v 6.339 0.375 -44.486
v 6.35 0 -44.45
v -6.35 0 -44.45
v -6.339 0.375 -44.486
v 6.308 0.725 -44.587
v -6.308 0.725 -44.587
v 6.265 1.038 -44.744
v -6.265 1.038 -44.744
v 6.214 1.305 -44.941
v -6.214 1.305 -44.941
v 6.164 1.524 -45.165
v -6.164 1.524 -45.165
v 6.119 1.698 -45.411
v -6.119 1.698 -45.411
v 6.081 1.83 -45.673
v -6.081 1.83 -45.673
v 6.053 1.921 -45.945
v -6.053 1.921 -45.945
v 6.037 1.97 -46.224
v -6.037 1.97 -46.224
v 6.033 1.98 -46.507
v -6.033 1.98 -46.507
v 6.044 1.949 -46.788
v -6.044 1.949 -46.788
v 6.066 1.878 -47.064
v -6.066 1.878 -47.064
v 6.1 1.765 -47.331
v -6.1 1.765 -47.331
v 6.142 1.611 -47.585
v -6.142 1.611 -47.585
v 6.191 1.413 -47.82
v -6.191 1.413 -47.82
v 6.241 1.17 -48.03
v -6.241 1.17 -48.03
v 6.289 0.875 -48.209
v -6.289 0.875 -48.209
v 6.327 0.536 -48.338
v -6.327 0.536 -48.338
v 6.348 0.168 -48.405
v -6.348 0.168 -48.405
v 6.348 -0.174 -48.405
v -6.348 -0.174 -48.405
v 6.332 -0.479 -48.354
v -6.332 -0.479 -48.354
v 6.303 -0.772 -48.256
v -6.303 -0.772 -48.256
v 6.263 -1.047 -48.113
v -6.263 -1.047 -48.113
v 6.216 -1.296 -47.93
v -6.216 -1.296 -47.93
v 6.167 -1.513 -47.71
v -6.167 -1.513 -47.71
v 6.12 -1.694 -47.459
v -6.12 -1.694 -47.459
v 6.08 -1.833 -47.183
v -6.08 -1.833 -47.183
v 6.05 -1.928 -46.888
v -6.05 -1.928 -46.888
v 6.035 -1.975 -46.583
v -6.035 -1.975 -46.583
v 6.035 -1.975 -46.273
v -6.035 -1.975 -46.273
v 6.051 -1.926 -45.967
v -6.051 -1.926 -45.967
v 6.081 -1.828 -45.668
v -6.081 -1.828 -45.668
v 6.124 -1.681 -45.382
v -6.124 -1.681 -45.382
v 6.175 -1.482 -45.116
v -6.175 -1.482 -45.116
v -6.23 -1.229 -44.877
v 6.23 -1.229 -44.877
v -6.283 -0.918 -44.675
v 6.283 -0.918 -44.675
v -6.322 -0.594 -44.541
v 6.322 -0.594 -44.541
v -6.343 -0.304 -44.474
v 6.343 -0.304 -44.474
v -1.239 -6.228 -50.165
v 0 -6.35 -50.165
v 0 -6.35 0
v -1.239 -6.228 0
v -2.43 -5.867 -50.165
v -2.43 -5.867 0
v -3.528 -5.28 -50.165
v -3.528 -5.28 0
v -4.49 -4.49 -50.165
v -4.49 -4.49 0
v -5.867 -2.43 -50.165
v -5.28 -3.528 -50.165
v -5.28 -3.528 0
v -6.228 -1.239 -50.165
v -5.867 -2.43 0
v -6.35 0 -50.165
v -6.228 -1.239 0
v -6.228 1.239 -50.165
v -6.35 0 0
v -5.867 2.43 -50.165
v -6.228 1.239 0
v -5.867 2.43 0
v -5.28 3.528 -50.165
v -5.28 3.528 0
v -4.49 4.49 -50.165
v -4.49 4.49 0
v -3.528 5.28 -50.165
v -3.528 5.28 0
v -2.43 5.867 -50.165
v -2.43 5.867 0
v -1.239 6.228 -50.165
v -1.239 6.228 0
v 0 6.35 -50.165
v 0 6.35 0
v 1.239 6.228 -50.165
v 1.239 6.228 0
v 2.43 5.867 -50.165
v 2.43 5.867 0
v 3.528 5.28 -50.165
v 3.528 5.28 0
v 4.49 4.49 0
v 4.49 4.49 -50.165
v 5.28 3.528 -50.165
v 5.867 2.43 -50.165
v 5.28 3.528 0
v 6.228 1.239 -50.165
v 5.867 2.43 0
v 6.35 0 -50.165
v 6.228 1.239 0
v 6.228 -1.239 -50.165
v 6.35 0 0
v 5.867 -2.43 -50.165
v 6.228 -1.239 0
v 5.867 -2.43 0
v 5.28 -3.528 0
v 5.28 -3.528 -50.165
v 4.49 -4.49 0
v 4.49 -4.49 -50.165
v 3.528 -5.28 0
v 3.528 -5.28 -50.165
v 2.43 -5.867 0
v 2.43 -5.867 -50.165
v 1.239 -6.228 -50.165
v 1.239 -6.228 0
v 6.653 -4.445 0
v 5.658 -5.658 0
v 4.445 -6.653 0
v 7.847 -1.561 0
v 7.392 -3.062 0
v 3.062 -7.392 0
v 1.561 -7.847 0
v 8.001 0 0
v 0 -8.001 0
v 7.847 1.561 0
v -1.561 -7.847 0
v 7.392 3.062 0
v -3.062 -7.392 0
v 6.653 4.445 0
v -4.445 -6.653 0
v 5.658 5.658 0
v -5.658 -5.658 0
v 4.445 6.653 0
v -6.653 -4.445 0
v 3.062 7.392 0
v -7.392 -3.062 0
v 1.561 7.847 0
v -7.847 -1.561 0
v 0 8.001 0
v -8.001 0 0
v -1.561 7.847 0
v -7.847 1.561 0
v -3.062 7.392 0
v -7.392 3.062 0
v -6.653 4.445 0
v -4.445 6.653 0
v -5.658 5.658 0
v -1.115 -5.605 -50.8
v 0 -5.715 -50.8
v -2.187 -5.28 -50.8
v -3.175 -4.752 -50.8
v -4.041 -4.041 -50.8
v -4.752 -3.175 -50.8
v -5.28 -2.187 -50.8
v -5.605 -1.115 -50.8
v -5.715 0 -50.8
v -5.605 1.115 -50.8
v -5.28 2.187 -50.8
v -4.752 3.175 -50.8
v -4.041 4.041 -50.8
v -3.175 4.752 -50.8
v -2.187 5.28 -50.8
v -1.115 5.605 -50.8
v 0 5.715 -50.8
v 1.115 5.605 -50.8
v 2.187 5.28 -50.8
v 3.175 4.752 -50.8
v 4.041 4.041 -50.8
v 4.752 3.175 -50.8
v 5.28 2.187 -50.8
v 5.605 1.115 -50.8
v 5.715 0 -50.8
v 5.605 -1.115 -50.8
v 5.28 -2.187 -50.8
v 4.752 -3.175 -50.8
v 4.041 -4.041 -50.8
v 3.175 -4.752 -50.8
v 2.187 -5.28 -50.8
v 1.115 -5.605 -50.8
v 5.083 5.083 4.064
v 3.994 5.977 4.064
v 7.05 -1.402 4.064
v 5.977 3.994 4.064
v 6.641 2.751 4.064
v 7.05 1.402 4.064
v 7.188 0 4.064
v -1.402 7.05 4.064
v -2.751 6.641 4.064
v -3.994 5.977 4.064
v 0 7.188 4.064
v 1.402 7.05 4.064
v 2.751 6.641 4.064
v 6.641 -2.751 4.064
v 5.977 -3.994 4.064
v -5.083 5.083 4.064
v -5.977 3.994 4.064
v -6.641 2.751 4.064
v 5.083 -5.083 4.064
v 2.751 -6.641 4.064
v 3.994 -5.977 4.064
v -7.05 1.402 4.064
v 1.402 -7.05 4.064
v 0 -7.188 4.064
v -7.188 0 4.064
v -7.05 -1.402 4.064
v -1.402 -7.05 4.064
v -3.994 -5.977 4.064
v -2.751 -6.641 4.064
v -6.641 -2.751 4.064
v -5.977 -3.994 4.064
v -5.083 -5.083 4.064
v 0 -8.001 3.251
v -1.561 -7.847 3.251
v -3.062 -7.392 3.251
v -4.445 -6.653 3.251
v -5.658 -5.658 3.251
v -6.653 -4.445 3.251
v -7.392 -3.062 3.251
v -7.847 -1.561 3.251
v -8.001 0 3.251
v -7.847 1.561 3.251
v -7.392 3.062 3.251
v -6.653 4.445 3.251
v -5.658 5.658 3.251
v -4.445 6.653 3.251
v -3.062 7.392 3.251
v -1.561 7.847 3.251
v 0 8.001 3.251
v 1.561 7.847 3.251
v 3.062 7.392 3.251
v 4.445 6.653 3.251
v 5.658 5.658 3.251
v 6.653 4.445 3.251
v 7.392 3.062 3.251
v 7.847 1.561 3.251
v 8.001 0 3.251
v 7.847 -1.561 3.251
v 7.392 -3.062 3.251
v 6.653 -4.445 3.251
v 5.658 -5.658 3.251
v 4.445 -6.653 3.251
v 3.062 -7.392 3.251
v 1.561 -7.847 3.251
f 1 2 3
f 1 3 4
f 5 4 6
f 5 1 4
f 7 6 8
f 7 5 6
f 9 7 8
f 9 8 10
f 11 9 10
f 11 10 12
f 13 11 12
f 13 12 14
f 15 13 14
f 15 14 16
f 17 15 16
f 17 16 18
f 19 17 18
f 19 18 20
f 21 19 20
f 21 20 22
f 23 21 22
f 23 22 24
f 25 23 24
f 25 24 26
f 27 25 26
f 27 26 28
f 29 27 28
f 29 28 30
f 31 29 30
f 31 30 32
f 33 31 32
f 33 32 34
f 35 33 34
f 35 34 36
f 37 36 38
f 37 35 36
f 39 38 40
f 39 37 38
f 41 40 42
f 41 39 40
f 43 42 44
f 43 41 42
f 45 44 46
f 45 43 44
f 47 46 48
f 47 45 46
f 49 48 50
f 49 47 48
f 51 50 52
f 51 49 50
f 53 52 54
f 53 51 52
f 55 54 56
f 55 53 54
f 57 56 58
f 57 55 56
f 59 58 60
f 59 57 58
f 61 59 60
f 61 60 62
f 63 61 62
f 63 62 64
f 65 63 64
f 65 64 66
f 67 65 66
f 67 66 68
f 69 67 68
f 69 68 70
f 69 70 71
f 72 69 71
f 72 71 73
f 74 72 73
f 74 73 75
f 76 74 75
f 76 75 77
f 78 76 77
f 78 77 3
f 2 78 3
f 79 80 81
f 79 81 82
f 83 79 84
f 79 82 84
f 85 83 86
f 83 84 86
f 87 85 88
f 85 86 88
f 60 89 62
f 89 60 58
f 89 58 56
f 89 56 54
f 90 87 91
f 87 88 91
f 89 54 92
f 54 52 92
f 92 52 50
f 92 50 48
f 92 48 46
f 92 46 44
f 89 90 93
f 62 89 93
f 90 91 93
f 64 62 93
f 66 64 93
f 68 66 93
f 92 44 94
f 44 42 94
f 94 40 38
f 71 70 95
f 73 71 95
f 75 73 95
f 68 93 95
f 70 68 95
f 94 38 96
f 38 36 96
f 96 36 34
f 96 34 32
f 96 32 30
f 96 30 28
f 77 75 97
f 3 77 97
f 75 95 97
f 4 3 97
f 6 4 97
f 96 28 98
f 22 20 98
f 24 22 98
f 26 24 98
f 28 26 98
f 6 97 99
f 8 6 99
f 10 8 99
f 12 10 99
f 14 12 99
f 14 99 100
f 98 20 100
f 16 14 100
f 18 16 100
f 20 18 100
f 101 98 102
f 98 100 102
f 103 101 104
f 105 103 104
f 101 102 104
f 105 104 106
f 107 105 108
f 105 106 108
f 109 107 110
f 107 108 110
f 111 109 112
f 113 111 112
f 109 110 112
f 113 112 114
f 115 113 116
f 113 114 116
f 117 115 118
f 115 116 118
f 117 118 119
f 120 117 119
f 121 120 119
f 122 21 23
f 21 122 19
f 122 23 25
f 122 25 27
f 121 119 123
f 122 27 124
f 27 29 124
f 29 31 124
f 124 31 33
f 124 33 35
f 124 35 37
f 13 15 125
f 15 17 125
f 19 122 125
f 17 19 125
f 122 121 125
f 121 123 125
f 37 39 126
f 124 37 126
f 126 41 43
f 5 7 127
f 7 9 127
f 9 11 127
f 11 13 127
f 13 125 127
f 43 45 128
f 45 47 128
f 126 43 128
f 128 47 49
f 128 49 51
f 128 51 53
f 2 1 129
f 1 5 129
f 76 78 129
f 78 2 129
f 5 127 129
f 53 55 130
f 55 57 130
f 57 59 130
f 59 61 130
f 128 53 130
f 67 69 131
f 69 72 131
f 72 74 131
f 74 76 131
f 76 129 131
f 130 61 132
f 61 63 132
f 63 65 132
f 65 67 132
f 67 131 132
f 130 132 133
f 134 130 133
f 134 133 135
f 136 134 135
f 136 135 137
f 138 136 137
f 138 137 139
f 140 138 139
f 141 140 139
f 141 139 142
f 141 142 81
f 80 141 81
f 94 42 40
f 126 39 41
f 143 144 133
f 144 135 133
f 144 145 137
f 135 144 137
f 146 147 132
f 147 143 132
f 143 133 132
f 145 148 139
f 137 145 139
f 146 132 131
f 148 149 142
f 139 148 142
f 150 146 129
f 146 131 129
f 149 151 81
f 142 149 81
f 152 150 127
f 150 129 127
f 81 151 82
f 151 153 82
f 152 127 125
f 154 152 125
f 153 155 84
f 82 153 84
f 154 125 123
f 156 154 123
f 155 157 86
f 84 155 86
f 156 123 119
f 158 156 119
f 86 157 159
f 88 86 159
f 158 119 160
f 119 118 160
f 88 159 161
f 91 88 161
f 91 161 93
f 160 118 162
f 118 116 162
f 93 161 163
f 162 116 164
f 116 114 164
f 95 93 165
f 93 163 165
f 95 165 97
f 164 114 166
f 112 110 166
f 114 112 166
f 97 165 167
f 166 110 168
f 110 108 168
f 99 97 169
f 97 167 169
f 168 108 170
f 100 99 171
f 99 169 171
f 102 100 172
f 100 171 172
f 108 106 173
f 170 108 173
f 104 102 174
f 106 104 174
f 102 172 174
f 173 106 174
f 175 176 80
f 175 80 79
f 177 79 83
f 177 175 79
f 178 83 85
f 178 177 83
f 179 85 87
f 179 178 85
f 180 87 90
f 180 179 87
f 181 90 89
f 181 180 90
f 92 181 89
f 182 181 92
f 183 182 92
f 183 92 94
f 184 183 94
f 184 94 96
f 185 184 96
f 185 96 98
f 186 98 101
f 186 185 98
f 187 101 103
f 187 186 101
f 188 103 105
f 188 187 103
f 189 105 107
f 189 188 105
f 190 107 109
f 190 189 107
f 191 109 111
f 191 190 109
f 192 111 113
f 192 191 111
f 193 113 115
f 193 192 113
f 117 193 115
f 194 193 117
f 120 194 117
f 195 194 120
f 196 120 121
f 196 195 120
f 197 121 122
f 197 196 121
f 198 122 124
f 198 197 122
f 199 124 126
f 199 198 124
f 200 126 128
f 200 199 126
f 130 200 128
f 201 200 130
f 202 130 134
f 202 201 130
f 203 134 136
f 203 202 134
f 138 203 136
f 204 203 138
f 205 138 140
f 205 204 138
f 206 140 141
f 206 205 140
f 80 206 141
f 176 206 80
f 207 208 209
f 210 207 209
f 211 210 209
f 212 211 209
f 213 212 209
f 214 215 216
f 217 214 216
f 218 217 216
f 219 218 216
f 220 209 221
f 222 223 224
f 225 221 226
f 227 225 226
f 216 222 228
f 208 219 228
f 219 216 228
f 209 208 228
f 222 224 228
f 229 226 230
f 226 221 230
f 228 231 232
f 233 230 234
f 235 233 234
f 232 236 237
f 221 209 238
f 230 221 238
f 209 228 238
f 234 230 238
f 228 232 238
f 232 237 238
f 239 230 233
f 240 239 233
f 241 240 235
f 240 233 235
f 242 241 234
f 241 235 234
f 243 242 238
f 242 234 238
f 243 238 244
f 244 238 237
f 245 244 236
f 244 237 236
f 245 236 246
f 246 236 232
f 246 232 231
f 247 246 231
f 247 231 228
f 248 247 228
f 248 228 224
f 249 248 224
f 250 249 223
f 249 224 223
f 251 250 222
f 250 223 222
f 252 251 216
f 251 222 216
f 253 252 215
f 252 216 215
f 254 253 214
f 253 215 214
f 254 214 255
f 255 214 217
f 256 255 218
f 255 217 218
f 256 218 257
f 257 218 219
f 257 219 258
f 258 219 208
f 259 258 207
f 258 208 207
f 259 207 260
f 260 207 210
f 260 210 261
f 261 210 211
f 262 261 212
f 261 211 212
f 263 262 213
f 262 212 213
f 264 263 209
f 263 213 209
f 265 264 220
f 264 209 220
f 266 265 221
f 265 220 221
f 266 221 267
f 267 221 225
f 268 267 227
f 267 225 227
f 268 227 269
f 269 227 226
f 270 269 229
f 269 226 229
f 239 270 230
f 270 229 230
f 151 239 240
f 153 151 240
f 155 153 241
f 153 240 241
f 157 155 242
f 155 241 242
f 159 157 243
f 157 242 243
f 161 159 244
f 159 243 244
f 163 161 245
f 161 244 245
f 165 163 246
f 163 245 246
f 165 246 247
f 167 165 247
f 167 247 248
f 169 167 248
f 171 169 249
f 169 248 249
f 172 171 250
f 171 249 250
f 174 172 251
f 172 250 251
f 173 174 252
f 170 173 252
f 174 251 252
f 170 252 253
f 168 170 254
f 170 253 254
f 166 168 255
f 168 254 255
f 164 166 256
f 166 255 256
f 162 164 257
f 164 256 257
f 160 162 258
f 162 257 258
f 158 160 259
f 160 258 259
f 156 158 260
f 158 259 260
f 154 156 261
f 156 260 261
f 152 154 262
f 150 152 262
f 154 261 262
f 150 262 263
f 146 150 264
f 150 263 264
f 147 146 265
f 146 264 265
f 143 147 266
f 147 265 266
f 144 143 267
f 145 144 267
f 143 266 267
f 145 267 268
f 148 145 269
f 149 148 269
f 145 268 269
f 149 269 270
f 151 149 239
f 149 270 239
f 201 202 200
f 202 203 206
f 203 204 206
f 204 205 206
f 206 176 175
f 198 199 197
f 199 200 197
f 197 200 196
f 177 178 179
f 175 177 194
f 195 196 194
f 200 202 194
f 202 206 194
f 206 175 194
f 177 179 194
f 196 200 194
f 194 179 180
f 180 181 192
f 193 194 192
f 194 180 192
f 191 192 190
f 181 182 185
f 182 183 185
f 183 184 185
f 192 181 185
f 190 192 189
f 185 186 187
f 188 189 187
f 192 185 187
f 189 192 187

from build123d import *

# Parameters (mm, degrees)
CUT_EXTRUDE1_DEPTH      = 59.259372654
CUT_EXTRUDE1_DEPTH_BACK = 59.259372654
SKETCH2_R               = 1.9812
CHAMFER1_SIZE           = 0.8128
CHAMFER2_SIZE           = 0.635


with BuildPart() as part:
    # Sketch4 → Revolve1 (revolve)
    with BuildSketch(Plane(origin=(0, 0, 0), x_dir=(0, 0, -1), z_dir=(1, 0, 0)), mode=Mode.PRIVATE) as revolve1_sk:
        Polygon((-4.064, 0), (50.8, 0), (50.8, 6.35), (0, 6.35), (0, 8.001), (-4.064, 8.001), align=None)
    revolve(revolve1_sk.sketch.rotate(Axis((0, 0, 4.064), (0, 0, -1)), 180), axis=Axis((0, 0, 4.064), (0, 0, -1)))

    # Sketch2 → Cut-Extrude1 (cut, two sides: drawn at the far end of the back side and taken through both)
    with BuildSketch(Plane(origin=(0, 0, 6.35), x_dir=(0, 0, 1), z_dir=(-1, 0, 0)).offset(-CUT_EXTRUDE1_DEPTH_BACK)):
        with Locations((-52.7812, 0)):
            Circle(SKETCH2_R)
    extrude(amount=CUT_EXTRUDE1_DEPTH + CUT_EXTRUDE1_DEPTH_BACK, mode=Mode.SUBTRACT)

    # Chamfer1
    chamfer1_edges = [part.edges().sort_by_distance(p)[0] for p in [
        (0, 8.001, 4.064),
    ]]
    chamfer(chamfer1_edges, length=CHAMFER1_SIZE)

    # Chamfer2
    chamfer2_edges = [part.edges().sort_by_distance(p)[0] for p in [
        (0, 6.35, -50.8),
    ]]
    chamfer(chamfer2_edges, length=CHAMFER2_SIZE)


solid = part.part
